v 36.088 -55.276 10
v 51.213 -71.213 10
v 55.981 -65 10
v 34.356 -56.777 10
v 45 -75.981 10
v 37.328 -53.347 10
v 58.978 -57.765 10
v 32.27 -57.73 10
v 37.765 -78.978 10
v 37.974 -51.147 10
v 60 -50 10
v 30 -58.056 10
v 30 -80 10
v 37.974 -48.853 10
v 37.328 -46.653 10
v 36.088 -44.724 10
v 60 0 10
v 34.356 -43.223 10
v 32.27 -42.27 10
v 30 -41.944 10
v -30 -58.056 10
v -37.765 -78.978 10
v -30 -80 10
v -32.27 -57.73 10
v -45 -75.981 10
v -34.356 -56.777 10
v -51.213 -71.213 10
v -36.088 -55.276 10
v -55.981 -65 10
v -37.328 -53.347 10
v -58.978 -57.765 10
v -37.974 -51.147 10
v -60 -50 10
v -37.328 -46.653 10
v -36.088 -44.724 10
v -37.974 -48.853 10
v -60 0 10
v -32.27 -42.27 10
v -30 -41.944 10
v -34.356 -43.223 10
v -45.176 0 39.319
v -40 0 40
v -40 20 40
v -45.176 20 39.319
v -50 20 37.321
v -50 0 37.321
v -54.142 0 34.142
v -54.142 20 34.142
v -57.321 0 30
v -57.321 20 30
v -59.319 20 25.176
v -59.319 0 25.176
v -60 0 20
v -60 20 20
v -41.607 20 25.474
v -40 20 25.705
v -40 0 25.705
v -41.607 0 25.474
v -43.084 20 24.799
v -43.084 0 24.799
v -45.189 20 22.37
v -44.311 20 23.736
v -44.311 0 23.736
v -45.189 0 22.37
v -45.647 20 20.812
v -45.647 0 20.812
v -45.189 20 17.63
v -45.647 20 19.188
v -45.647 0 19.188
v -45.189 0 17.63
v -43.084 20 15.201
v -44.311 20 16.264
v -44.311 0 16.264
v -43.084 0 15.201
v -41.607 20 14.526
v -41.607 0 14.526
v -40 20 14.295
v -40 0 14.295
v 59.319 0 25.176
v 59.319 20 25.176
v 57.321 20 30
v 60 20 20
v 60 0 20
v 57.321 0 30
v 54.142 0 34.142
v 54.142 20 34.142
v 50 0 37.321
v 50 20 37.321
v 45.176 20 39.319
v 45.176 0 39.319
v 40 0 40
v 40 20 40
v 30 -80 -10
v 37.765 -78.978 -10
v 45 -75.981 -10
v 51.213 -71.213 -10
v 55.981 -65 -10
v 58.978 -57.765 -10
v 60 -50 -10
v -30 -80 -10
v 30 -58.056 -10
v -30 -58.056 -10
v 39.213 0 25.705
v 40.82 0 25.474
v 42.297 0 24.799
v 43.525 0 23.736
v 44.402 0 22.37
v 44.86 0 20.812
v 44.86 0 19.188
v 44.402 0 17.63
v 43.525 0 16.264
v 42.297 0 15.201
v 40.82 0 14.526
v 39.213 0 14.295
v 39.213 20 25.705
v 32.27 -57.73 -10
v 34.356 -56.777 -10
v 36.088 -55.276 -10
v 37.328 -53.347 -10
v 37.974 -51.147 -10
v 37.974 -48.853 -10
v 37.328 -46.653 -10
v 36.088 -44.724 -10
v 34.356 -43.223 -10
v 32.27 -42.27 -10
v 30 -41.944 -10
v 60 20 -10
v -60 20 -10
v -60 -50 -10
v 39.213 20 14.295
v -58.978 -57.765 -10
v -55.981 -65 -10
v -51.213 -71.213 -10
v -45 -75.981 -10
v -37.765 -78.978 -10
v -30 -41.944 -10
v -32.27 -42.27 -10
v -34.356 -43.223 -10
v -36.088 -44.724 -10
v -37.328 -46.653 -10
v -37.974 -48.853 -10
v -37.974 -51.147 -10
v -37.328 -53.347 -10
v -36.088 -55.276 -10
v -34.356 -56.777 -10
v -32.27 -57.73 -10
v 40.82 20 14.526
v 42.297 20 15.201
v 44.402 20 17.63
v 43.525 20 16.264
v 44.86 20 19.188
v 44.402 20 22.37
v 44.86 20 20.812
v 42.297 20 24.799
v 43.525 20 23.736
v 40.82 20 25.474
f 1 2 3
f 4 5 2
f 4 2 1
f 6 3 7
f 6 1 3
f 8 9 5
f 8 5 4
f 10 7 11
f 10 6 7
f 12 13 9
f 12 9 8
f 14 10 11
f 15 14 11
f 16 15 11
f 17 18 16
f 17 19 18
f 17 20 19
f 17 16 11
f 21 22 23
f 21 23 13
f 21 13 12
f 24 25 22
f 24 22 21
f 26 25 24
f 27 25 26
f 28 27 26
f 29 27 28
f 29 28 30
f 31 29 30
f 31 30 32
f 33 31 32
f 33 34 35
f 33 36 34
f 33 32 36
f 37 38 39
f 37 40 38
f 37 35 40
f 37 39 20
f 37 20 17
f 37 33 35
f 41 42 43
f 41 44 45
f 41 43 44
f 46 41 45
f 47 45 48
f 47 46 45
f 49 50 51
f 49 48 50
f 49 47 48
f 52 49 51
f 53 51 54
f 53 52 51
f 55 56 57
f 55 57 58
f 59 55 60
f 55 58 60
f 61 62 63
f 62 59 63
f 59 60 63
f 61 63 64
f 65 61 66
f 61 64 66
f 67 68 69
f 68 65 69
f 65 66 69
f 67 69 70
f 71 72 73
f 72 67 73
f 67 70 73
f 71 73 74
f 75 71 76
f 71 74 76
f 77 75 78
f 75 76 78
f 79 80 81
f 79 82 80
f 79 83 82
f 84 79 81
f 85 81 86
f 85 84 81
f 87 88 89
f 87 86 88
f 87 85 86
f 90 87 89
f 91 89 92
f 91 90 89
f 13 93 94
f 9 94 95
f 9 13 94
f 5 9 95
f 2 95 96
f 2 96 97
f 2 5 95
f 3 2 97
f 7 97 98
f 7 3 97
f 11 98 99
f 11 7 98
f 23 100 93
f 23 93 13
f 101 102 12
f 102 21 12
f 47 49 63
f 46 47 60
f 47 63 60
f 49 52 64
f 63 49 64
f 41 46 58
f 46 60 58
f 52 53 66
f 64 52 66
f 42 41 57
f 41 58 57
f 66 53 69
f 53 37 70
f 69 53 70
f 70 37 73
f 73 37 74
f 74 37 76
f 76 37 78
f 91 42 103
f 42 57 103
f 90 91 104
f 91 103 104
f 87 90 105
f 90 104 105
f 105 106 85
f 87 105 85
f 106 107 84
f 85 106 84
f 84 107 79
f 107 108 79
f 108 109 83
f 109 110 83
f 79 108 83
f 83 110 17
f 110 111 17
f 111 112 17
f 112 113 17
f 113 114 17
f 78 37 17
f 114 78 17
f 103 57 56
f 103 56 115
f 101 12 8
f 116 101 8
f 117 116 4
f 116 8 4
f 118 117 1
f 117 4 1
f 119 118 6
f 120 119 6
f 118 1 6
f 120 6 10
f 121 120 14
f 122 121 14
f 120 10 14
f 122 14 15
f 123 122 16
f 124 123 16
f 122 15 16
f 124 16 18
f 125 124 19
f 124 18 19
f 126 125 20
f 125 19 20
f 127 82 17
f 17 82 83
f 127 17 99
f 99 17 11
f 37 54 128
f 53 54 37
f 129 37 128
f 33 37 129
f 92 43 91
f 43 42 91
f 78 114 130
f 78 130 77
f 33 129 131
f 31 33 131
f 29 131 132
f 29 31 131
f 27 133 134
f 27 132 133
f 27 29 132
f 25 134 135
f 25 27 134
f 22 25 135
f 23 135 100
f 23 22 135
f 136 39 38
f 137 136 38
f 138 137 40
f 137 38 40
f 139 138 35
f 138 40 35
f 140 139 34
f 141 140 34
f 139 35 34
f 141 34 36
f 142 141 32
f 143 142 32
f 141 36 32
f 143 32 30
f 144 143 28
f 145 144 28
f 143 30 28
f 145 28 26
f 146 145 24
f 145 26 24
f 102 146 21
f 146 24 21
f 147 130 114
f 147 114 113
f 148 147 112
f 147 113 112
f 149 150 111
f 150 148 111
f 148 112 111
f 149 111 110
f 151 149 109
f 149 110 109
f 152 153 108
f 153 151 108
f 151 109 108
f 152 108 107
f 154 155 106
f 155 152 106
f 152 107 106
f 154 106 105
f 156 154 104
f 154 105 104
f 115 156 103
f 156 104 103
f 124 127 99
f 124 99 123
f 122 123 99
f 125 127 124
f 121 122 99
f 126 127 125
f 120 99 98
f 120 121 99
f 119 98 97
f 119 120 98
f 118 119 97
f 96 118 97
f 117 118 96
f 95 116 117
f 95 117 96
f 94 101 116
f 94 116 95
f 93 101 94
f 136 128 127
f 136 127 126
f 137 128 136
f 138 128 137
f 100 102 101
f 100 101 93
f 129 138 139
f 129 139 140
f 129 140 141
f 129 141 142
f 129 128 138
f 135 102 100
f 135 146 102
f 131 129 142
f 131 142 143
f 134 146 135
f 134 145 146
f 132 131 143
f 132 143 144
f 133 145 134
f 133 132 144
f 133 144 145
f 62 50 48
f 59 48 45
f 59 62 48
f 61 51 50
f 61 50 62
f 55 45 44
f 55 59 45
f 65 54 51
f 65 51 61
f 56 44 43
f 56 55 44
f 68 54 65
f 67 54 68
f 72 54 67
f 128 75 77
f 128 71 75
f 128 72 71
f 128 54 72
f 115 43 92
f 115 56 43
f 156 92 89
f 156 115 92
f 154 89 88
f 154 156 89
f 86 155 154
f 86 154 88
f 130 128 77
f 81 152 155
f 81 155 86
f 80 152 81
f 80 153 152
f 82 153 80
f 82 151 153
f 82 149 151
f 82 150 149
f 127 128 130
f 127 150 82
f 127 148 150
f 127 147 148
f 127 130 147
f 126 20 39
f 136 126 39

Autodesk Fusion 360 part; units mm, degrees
sketch "Sketch1" plane through (0, 0, 0) normal (0, 1, 0) x (1, 0, 0)
  line L0 (-60, -10) -> (60, -10)
  line L1 (60, -10) -> (60, 10)
  line L2 (60, 10) -> (-60, 10)
  line L3 (-60, 10) -> (-60, -10)
  line L4 (-60, -10) -> (60, 10) construction
  line L5 (60, -10) -> (-60, 10) construction
  line L6 (-60, -10) -> (-60, -20)
  line L7 (-40, -40) -> (40, -40)
  line L8 (60, -20) -> (60, -10)
  line L9 (39.2131, -14.2951) -> (-40, -14.2951)
  arc A0 (-40, -14.2951) -> (-40, -25.7049) centre (-40, -20) ccw
  line L10 (-40, -25.7049) -> (39.2131, -25.7049)
  arc A1 (39.2131, -25.7049) -> (39.2131, -14.2951) centre (39.2131, -20) ccw
  line L11 (39.2131, -20) -> (-40, -20) construction
  arc A2 (-60, -20) -> (-40, -40) centre (-40, -20) ccw
  arc A3 (40, -40) -> (60, -20) centre (40, -20) ccw
  point P0 (-60, -40)
  point P1 (60, -40)
  point P2 (-0.3934, -20)
  dimension "d1" = 20
  dimension "d2" = 120
  dimension "d3" = 30
  dimension "d4" = 120
  dimension "d5" = 20
  dimension "d6" = 20
  dimension "d7" = 30
extrude "Extrude1" add sketch "Sketch1" along normal blind 20
sketch "Sketch2" plane through (-60, 0, 0) normal (-1, 0, 0) x (0, -1, 0)
  line L0 (0, -10) -> (0, 20)
  line L1 (0, 20) -> (-20, 20)
  line L2 (-20, 20) -> (-20, -10)
  line L3 (-20, -10) -> (0, -10)
  line L4 (0, -10) -> (80, -10)
  line L5 (80, -10) -> (80, 10)
  line L6 (80, 10) -> (0, 10)
  line L7 (0, 10) -> (0, -10)
  dimension "d10" = 80
  dimension "d11" = 20
extrude "Extrude2" add sketch "Sketch2" against normal blind 120 contours L0 L4 L5 L6 L7
fillet "Fillet1" radius 30 2 edges at (-60, -80, 0) (60, -80, 0)
sketch "Sketch3" plane through (0, 0, 10) normal (0, 0, 1) x (-1, 0, 0)
  arc A0 (-30, 80) -> (-60, 50) centre (-30, 50) ccw
  line L0 (-60, 50) -> (-60, 0)
  line L1 (-60, 0) -> (60, 0)
  line L2 (60, 0) -> (60, 50)
  arc A1 (60, 50) -> (30, 80) centre (30, 50) ccw
  line L3 (30, 80) -> (-30, 80)
  line L4 (-30, 41.9438) -> (30, 41.9438)
  arc A2 (30, 41.9438) -> (30, 58.0562) centre (30, 50) ccw
  line L5 (30, 58.0562) -> (-30, 58.0562)
  arc A3 (-30, 58.0562) -> (-30, 41.9438) centre (-30, 50) ccw
  line L6 (-30, 50) -> (30, 50) construction
  point P0 (0, 50)
  dimension "d16" = 60
  dimension "d18" = 30
extrude "Extrude3" cut sketch "Sketch3" against normal blind 58.307 contours L4 A2 L5 A3
